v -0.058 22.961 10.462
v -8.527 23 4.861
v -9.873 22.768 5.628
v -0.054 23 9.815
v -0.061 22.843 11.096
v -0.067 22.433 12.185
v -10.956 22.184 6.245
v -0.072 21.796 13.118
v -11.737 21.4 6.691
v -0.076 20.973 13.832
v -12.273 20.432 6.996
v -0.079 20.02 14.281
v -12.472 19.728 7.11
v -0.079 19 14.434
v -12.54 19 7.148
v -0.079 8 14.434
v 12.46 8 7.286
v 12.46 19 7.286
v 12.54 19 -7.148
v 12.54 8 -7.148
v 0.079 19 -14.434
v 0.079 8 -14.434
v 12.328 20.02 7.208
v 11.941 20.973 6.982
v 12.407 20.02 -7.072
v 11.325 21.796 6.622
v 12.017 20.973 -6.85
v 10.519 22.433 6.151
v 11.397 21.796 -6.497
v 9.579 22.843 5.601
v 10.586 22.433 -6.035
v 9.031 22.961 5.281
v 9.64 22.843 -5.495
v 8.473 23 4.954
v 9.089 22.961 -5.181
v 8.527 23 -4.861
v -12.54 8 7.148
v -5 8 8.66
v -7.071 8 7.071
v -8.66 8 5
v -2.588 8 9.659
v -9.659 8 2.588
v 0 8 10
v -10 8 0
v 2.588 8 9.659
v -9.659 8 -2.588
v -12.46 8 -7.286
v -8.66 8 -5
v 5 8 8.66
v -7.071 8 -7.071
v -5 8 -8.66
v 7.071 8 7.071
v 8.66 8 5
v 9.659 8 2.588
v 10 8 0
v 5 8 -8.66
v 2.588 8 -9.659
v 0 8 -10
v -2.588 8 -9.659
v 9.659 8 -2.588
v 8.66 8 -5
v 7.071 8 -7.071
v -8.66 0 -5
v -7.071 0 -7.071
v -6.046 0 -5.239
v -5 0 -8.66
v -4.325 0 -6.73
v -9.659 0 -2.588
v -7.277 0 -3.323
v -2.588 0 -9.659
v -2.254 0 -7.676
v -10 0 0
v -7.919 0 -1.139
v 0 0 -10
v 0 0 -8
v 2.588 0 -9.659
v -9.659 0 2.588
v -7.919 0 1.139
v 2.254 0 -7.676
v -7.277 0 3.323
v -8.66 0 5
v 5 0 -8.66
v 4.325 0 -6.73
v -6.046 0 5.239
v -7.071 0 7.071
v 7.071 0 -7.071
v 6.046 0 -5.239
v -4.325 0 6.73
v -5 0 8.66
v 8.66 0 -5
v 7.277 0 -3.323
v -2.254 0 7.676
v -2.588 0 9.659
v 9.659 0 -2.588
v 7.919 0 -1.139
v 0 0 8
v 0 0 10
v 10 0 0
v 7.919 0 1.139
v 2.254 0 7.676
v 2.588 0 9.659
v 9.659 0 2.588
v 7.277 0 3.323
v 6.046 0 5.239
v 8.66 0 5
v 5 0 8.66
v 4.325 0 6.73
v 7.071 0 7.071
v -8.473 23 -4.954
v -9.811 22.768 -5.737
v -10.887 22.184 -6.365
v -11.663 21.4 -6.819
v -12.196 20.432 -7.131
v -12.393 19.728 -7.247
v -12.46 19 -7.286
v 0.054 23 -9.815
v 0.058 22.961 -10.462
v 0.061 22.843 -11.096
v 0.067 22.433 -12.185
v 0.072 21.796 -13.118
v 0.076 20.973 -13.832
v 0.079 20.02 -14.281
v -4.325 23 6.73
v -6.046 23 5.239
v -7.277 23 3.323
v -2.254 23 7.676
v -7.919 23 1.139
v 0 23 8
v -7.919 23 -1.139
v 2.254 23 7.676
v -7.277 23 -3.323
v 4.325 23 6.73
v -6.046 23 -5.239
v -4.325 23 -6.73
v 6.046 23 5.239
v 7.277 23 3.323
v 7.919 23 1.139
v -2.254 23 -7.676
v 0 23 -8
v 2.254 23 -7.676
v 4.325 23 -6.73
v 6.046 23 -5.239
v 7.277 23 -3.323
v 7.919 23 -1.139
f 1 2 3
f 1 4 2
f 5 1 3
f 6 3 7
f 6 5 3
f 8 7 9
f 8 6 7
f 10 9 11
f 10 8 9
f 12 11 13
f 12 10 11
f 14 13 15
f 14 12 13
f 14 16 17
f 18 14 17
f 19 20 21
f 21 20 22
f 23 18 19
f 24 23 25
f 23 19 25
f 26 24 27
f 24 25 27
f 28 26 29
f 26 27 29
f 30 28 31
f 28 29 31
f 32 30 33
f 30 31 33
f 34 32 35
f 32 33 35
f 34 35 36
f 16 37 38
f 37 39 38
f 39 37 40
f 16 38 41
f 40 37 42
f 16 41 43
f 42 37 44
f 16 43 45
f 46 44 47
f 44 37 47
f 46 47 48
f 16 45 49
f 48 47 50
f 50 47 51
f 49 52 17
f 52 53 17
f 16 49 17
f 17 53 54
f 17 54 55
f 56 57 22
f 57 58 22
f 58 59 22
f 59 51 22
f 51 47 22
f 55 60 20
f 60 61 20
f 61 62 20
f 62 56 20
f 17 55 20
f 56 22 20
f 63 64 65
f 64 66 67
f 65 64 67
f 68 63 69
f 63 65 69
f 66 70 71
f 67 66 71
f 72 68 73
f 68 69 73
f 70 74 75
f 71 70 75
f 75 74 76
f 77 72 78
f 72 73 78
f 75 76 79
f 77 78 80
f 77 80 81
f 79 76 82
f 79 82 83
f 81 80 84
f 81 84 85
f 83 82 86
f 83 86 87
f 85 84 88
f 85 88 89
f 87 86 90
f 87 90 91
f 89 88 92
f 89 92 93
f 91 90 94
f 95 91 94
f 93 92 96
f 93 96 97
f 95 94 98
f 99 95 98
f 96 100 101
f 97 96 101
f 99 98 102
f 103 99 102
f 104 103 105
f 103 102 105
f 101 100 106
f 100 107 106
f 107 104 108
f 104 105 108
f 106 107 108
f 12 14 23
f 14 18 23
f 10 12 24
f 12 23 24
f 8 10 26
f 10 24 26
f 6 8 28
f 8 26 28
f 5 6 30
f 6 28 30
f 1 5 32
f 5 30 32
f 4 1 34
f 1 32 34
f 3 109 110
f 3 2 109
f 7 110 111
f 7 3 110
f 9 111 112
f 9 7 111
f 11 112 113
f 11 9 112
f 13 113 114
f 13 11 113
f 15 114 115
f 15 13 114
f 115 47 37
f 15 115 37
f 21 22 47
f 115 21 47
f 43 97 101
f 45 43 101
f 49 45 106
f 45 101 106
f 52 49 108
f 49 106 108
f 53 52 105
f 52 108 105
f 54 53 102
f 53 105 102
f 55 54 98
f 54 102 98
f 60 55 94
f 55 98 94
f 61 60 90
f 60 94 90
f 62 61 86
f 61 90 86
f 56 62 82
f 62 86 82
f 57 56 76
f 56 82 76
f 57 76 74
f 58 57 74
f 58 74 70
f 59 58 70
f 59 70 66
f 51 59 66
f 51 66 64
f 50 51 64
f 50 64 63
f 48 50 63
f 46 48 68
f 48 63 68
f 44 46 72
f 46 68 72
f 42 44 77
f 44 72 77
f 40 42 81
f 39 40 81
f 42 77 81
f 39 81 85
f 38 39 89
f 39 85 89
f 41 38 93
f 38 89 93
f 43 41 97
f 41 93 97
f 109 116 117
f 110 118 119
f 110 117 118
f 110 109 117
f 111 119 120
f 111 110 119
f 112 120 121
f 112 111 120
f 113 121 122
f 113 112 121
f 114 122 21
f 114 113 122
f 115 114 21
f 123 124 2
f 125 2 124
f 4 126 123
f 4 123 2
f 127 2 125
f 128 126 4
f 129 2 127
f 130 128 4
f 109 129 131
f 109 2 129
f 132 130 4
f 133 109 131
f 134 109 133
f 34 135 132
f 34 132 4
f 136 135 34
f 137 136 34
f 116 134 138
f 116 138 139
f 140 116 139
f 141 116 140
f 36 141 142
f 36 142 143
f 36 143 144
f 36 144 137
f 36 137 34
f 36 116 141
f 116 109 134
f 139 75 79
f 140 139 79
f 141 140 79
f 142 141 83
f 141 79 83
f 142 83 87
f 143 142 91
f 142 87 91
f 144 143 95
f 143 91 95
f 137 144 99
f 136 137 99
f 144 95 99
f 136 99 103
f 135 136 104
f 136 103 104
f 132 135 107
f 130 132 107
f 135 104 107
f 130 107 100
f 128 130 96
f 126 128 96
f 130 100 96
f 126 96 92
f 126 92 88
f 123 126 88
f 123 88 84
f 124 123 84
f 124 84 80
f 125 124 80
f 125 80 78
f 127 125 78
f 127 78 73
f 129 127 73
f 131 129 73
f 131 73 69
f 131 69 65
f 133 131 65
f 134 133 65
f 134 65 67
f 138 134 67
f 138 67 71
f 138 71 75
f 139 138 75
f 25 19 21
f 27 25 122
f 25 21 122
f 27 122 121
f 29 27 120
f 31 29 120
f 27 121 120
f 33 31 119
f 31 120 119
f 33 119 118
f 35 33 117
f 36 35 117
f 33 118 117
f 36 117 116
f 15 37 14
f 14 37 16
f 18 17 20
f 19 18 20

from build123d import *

# Parameters (mm, degrees)
SKETCH1_R           = 10
BOSS_EXTRUDE1_DEPTH = 8
BOSS_EXTRUDE2_DEPTH = 15
CUT_EXTRUDE1_REACH  = 31.909
SKETCH3_R           = 8
FILLET1_R           = 4


with BuildPart() as part:
    # Sketch1 → Boss-Extrude1 (new body)
    with BuildSketch(Plane(origin=(0, 0, 0), x_dir=(1, 0, 0), z_dir=(0, 1, 0))):
        with Locations(Location((0, 0, 0), (0, 0, 270))):
            Circle(SKETCH1_R)
    extrude(amount=BOSS_EXTRUDE1_DEPTH)

    # Sketch2 → Boss-Extrude2 (add)
    with BuildSketch(Plane(origin=(0, 8, 0), x_dir=(1, 0, 0), z_dir=(0, 1, 0))):
        Polygon((12.460098185, -7.285553277), (12.539523311, 7.147984923), (0.079425127, 14.4335382), (-12.460098185, 7.285553277), (-12.539523311, -7.147984923), (-0.079425127, -14.4335382), align=None)
    extrude(amount=BOSS_EXTRUDE2_DEPTH)

    # Sketch3 → Cut-Extrude1 (cut, up to next)
    with BuildSketch(Plane.XZ, mode=Mode.PRIVATE) as cut_extrude1_sk1:
        with Locations(Location((0, 0, 0), (0, 0, 270))):
            Circle(SKETCH3_R)
    cut_extrude1_tool1 = extrude(cut_extrude1_sk1.sketch, amount=-CUT_EXTRUDE1_REACH, mode=Mode.PRIVATE) & part.part
    add(cut_extrude1_tool1.solids().sort_by_distance((0, 0, 0))[0], mode=Mode.SUBTRACT)

    # Fillet1
    fillet1_edges = [part.edges().sort_by_distance(p)[0] for p in [
        (6.190336529, 23, 10.859545739),
        (12.499810748, 23, 0.068784177),
        (6.309474219, 23, -10.790761562),
        (-6.190336529, 23, -10.859545739),
        (-12.499810748, 23, -0.068784177),
        (-6.309474219, 23, 10.790761562),
    ]]
    fillet(fillet1_edges, radius=FILLET1_R)


solid = part.part
